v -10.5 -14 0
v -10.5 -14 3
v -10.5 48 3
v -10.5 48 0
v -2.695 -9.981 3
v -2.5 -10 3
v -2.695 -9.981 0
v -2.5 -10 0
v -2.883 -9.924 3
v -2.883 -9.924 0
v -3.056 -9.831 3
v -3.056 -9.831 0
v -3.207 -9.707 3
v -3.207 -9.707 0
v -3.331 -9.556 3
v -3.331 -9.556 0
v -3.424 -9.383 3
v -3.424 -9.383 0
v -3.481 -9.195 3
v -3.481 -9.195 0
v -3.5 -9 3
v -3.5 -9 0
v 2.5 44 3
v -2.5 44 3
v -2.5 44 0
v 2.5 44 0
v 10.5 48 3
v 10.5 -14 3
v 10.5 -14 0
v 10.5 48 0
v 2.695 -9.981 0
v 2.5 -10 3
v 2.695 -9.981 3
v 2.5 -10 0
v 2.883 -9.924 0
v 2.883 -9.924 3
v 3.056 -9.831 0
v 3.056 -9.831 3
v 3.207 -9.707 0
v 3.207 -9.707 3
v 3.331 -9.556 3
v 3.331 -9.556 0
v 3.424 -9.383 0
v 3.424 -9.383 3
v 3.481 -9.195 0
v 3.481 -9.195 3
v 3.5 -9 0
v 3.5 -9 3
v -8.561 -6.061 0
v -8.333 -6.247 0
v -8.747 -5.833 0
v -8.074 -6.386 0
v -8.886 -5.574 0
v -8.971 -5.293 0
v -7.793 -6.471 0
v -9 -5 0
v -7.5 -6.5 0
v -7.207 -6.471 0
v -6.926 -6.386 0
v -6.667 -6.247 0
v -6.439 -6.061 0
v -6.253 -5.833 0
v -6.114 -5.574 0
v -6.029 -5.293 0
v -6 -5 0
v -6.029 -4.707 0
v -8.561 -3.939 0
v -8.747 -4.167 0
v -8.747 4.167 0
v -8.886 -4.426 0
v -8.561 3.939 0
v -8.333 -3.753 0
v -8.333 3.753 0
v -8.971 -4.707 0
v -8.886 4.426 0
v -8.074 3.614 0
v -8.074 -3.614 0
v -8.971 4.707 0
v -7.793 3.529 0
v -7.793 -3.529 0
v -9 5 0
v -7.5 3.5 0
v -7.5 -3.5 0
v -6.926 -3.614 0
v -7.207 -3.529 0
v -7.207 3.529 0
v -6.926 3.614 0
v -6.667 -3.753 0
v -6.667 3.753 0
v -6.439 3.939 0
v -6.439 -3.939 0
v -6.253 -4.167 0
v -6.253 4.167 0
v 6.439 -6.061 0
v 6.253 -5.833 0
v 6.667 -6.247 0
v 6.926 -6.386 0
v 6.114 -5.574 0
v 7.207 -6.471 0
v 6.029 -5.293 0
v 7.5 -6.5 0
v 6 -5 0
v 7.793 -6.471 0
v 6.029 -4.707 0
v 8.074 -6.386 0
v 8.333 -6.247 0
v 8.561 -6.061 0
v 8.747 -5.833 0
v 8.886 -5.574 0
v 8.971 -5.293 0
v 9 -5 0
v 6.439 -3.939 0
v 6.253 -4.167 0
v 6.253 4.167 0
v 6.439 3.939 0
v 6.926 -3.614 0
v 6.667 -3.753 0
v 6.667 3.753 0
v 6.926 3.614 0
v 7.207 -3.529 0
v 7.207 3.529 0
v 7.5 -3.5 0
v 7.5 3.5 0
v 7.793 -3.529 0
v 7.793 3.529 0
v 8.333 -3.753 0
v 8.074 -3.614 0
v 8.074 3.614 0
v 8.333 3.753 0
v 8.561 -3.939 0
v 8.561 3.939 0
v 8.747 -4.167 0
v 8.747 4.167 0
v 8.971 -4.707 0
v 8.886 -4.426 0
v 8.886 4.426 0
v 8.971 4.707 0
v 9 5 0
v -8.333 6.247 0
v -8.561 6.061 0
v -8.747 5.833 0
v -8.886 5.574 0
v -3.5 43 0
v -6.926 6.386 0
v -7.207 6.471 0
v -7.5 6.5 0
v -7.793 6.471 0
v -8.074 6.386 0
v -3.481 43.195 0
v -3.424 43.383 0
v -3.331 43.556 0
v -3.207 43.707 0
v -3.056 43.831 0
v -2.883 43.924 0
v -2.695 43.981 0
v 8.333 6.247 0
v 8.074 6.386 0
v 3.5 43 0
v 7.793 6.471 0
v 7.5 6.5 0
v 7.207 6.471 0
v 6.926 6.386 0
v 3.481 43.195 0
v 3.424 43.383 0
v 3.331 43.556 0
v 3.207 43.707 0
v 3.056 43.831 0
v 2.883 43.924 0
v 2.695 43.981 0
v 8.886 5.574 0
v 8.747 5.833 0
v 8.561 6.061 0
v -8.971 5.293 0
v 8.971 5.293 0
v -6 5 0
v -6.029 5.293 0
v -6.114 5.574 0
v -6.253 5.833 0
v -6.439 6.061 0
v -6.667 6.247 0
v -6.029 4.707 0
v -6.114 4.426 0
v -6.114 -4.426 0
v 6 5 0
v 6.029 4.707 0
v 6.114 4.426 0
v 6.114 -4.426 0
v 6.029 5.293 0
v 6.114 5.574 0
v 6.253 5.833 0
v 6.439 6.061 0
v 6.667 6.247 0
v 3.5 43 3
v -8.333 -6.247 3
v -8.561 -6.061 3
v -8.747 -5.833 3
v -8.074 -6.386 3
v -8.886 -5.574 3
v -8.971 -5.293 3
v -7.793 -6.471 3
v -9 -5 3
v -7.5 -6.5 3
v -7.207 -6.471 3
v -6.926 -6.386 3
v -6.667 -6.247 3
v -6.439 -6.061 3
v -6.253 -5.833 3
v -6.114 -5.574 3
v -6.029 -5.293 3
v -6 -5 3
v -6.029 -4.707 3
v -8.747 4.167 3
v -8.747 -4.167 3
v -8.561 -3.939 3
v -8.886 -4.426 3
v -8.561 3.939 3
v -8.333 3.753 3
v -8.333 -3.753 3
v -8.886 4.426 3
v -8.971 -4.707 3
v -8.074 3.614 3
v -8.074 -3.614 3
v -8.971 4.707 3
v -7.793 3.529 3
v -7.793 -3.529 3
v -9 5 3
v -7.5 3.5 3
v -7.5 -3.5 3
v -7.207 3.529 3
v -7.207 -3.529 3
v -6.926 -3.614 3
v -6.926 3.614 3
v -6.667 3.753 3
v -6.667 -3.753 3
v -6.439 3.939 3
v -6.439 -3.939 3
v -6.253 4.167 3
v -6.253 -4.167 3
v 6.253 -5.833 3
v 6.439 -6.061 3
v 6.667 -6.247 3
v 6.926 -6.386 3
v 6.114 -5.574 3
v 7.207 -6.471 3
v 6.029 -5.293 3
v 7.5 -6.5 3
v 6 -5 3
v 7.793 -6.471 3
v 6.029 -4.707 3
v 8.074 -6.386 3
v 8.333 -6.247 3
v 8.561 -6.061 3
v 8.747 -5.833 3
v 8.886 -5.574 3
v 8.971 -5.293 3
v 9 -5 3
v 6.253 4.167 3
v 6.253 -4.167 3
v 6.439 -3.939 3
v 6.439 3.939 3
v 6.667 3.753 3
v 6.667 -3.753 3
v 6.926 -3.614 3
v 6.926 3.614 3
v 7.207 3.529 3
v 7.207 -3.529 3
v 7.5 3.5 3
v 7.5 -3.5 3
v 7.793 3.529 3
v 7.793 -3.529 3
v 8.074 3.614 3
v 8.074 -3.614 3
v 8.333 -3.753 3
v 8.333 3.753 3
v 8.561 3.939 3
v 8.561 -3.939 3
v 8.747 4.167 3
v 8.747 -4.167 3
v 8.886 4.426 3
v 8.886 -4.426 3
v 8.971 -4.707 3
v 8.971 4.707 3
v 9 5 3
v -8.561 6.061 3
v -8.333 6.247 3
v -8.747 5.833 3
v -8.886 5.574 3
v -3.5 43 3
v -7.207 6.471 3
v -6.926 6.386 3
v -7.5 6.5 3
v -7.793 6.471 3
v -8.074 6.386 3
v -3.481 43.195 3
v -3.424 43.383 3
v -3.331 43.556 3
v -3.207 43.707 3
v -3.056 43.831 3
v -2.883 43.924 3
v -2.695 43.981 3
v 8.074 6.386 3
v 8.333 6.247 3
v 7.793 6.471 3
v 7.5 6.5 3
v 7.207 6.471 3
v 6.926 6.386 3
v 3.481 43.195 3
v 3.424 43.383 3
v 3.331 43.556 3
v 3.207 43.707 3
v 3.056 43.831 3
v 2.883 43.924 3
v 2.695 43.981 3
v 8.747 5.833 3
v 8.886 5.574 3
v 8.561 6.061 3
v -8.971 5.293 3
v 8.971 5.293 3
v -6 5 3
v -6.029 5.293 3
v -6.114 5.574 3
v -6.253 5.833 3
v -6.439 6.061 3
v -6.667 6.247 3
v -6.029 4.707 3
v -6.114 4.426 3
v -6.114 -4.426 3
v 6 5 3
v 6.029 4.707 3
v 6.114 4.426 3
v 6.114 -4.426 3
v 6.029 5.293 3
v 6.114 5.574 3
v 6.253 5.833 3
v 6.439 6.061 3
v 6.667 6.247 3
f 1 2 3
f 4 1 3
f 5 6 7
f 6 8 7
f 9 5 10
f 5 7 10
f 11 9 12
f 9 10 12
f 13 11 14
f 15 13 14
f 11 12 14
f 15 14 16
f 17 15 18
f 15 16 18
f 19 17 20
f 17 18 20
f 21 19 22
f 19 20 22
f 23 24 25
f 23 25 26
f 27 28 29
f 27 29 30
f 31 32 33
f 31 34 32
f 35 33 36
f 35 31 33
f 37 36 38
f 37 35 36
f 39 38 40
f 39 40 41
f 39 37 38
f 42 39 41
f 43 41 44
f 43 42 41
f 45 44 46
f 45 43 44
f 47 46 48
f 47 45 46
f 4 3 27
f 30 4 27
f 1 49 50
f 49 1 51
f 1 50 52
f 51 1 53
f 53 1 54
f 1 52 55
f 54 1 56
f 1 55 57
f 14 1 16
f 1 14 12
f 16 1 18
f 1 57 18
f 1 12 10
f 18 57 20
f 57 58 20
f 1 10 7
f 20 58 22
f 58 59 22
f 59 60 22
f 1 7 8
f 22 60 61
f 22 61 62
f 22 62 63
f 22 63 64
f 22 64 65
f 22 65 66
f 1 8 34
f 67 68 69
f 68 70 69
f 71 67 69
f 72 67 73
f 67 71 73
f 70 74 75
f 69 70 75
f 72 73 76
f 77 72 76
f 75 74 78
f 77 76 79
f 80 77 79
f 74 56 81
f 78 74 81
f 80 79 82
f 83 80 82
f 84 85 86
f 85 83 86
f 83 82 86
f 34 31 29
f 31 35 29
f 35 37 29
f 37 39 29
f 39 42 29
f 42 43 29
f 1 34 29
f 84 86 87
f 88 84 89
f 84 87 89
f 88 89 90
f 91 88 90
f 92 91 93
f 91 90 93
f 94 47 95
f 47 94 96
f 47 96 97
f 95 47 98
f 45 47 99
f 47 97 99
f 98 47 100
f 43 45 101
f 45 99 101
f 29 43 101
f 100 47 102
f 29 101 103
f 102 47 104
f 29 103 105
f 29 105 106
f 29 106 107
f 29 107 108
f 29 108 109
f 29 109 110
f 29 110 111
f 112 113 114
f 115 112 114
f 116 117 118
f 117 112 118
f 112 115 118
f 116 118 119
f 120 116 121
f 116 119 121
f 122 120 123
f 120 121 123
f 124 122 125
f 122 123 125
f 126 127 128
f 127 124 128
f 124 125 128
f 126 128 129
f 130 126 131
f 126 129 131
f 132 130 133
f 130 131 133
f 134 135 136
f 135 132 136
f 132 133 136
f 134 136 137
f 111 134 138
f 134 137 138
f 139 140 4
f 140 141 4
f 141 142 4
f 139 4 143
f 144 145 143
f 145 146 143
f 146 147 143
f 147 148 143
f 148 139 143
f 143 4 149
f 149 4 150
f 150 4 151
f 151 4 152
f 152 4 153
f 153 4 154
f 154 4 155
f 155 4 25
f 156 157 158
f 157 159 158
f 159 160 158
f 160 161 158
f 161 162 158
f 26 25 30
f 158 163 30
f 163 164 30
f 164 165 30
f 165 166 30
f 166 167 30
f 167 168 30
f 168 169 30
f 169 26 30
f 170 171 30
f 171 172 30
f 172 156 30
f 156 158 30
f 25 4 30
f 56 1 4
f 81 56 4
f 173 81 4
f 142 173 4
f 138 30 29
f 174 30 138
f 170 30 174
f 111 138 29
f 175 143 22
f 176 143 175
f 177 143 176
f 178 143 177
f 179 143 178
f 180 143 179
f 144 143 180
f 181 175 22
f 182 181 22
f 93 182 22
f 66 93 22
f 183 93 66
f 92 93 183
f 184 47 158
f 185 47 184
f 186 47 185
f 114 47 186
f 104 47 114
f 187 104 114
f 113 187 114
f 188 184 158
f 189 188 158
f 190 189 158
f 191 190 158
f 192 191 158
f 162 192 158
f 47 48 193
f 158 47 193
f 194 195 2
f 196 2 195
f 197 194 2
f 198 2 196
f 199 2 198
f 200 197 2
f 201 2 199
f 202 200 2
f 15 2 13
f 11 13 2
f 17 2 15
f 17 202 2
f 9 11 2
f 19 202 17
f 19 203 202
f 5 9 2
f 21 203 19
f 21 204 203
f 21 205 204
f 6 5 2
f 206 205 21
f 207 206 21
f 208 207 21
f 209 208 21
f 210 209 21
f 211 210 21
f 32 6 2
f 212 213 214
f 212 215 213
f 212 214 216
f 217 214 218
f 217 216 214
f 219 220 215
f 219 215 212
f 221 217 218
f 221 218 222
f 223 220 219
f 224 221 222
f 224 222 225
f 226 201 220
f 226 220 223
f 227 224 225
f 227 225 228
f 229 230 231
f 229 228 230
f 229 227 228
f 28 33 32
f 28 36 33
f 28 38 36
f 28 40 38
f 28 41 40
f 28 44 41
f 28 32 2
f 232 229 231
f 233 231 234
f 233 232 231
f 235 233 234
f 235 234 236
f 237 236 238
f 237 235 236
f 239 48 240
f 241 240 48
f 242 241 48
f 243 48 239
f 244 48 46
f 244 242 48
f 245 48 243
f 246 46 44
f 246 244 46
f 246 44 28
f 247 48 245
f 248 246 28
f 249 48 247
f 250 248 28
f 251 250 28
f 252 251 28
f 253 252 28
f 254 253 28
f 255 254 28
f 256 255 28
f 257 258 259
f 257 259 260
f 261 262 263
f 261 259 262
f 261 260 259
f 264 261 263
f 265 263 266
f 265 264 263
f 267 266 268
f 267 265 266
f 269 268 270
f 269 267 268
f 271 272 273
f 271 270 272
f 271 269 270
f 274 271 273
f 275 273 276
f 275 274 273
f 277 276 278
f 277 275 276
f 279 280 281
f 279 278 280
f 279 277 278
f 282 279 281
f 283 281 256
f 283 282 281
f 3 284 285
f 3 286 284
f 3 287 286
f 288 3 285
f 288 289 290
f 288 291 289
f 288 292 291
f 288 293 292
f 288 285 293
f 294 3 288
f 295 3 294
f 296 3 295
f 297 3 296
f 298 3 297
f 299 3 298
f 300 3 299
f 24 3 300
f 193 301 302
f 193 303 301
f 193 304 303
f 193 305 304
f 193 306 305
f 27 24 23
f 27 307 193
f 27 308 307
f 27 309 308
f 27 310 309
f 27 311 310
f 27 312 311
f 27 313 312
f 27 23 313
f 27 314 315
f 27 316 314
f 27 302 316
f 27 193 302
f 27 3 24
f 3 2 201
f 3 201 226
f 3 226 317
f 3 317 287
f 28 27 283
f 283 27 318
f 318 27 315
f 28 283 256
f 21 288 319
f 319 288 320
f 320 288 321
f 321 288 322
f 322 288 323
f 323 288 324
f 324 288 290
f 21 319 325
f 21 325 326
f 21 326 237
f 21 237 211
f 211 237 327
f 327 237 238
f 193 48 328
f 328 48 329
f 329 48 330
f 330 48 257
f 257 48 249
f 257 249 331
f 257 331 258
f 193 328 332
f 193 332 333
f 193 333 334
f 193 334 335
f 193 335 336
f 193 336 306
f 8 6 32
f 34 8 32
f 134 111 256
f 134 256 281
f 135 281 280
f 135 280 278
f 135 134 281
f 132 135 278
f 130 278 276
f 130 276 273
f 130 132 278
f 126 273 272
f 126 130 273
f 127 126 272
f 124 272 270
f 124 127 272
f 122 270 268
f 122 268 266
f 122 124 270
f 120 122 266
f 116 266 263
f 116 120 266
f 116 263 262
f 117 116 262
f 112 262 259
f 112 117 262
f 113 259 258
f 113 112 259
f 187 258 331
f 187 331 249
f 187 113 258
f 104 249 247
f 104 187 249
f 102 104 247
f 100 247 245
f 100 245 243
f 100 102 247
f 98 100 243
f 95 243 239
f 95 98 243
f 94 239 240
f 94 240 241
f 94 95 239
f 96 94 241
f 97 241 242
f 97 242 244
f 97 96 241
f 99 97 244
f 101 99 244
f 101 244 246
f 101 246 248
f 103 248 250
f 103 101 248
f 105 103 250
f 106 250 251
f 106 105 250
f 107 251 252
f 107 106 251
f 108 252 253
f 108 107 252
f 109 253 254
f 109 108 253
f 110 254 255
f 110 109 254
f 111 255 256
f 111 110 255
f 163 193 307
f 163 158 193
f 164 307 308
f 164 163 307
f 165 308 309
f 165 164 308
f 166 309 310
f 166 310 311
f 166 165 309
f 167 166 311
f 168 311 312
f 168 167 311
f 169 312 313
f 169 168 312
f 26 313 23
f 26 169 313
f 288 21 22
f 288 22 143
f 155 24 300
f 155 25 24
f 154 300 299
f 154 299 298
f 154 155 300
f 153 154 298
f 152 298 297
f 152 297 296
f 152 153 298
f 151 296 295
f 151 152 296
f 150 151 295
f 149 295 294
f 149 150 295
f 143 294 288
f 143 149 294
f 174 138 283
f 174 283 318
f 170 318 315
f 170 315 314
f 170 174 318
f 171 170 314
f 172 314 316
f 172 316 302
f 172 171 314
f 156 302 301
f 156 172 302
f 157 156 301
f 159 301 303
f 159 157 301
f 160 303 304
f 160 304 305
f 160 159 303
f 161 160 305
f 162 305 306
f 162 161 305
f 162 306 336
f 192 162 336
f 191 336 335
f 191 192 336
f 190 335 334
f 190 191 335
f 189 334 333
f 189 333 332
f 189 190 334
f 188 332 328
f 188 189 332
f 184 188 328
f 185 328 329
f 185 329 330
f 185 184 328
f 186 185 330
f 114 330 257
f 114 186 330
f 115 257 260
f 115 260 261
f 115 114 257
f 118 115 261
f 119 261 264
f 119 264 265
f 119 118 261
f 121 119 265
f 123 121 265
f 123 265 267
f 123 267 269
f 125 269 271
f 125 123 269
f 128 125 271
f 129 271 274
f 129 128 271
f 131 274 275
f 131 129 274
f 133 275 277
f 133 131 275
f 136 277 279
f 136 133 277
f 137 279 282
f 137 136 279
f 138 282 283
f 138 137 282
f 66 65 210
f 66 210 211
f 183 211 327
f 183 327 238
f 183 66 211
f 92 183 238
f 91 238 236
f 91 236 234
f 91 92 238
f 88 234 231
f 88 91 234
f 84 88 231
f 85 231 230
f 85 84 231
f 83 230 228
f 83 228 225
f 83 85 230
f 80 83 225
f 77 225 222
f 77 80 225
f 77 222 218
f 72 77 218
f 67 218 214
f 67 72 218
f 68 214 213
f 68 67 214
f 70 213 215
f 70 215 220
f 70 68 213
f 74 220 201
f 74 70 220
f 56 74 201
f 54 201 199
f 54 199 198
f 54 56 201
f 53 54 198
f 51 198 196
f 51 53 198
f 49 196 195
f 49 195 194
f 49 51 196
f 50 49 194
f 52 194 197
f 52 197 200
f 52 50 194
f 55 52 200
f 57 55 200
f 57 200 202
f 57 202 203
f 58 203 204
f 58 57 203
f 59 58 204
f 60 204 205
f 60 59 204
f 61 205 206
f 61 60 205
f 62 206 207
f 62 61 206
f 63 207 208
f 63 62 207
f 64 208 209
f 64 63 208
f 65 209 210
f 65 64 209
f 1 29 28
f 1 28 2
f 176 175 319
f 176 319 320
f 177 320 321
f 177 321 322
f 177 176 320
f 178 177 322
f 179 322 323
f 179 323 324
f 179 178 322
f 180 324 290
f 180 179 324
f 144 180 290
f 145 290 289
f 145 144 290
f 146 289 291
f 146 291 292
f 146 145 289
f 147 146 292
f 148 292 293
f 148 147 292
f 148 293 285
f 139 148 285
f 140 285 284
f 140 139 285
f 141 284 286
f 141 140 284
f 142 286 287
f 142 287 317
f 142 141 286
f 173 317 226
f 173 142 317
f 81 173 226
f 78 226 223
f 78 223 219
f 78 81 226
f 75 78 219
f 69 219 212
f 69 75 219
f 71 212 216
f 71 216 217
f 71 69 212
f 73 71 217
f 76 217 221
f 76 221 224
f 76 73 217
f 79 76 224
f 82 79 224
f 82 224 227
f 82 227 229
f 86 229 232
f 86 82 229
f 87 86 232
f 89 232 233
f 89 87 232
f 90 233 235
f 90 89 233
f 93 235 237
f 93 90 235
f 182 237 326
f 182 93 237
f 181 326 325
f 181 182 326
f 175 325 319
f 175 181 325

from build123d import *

# Parameters (mm, degrees)
SKETCH_1_R          = 1.5
EXTRUDE_1_DEPTH     = 3
FILLET_1_R          = 2
SKETCH_3_W          = 25.138692766
SKETCH_3_H          = 29.703861026
CUT_EXTRUDE_1_DEPTH = 38.353045391
SKETCH_4_W          = 21
SKETCH_4_H          = 34
EXTRUDE_2_DEPTH     = 3
SKETCH_5_W          = 7
SKETCH_5_H          = 54
CUT_EXTRUDE_2_DEPTH = 50.226517244
FILLET_2_R          = 1


with BuildPart() as part:
    # 草图1 → 凸台-拉伸1 (new body)
    with BuildSketch(Plane.XY):
        Polygon((-10.5, 14), (10.5, 14), (10.5, 4), (34.5, 4), (34.5, -4), (10.5, -4), (10.5, -14), (-10.5, -14), align=None)
        with Locations((-7.5, 5)):
            Circle(SKETCH_1_R, mode=Mode.SUBTRACT)
        with Locations((7.5, 5)):
            Circle(SKETCH_1_R, mode=Mode.SUBTRACT)
        with Locations((-7.5, -5)):
            Circle(SKETCH_1_R, mode=Mode.SUBTRACT)
        with Locations((7.5, -5)):
            Circle(SKETCH_1_R, mode=Mode.SUBTRACT)
        with Locations((16.5, 0)):
            Circle(SKETCH_1_R, mode=Mode.SUBTRACT)
        with Locations((31.5, 0)):
            Circle(SKETCH_1_R, mode=Mode.SUBTRACT)
    extrude(amount=EXTRUDE_1_DEPTH)

    # 圆角1
    fillet_1_edges = [part.edges().sort_by_distance(p)[0] for p in [
        (10.5, 4, 1.5),
        (10.5, -4, 1.5),
    ]]
    fillet(fillet_1_edges, radius=FILLET_1_R)

    # 草图3 → 切除-拉伸1 (cut, through all)
    with BuildSketch(Plane.XY.offset(3)):
        with Locations((23.069346383, -0.851930513)):
            Rectangle(SKETCH_3_W, SKETCH_3_H)
    extrude(amount=-CUT_EXTRUDE_1_DEPTH, mode=Mode.SUBTRACT)

    # 草图4 → 凸台-拉伸2 (add)
    with BuildSketch(Plane.XY.offset(3)):
        with Locations((0, 31)):
            Rectangle(SKETCH_4_W, SKETCH_4_H)
    extrude(amount=-EXTRUDE_2_DEPTH)

    # 草图5 → 切除-拉伸2 (cut, through all)
    with BuildSketch(Plane.XY.offset(3)):
        with Locations((0, 17)):
            Rectangle(SKETCH_5_W, SKETCH_5_H)
    extrude(amount=-CUT_EXTRUDE_2_DEPTH, mode=Mode.SUBTRACT)

    # 圆角2
    fillet_2_edges = [part.edges().sort_by_distance(p)[0] for p in [
        (-3.5, -10, 1.5),
        (-3.5, 44, 1.5),
        (3.5, 44, 1.5),
        (3.5, -10, 1.5),
    ]]
    fillet(fillet_2_edges, radius=FILLET_2_R)


solid = part.part
